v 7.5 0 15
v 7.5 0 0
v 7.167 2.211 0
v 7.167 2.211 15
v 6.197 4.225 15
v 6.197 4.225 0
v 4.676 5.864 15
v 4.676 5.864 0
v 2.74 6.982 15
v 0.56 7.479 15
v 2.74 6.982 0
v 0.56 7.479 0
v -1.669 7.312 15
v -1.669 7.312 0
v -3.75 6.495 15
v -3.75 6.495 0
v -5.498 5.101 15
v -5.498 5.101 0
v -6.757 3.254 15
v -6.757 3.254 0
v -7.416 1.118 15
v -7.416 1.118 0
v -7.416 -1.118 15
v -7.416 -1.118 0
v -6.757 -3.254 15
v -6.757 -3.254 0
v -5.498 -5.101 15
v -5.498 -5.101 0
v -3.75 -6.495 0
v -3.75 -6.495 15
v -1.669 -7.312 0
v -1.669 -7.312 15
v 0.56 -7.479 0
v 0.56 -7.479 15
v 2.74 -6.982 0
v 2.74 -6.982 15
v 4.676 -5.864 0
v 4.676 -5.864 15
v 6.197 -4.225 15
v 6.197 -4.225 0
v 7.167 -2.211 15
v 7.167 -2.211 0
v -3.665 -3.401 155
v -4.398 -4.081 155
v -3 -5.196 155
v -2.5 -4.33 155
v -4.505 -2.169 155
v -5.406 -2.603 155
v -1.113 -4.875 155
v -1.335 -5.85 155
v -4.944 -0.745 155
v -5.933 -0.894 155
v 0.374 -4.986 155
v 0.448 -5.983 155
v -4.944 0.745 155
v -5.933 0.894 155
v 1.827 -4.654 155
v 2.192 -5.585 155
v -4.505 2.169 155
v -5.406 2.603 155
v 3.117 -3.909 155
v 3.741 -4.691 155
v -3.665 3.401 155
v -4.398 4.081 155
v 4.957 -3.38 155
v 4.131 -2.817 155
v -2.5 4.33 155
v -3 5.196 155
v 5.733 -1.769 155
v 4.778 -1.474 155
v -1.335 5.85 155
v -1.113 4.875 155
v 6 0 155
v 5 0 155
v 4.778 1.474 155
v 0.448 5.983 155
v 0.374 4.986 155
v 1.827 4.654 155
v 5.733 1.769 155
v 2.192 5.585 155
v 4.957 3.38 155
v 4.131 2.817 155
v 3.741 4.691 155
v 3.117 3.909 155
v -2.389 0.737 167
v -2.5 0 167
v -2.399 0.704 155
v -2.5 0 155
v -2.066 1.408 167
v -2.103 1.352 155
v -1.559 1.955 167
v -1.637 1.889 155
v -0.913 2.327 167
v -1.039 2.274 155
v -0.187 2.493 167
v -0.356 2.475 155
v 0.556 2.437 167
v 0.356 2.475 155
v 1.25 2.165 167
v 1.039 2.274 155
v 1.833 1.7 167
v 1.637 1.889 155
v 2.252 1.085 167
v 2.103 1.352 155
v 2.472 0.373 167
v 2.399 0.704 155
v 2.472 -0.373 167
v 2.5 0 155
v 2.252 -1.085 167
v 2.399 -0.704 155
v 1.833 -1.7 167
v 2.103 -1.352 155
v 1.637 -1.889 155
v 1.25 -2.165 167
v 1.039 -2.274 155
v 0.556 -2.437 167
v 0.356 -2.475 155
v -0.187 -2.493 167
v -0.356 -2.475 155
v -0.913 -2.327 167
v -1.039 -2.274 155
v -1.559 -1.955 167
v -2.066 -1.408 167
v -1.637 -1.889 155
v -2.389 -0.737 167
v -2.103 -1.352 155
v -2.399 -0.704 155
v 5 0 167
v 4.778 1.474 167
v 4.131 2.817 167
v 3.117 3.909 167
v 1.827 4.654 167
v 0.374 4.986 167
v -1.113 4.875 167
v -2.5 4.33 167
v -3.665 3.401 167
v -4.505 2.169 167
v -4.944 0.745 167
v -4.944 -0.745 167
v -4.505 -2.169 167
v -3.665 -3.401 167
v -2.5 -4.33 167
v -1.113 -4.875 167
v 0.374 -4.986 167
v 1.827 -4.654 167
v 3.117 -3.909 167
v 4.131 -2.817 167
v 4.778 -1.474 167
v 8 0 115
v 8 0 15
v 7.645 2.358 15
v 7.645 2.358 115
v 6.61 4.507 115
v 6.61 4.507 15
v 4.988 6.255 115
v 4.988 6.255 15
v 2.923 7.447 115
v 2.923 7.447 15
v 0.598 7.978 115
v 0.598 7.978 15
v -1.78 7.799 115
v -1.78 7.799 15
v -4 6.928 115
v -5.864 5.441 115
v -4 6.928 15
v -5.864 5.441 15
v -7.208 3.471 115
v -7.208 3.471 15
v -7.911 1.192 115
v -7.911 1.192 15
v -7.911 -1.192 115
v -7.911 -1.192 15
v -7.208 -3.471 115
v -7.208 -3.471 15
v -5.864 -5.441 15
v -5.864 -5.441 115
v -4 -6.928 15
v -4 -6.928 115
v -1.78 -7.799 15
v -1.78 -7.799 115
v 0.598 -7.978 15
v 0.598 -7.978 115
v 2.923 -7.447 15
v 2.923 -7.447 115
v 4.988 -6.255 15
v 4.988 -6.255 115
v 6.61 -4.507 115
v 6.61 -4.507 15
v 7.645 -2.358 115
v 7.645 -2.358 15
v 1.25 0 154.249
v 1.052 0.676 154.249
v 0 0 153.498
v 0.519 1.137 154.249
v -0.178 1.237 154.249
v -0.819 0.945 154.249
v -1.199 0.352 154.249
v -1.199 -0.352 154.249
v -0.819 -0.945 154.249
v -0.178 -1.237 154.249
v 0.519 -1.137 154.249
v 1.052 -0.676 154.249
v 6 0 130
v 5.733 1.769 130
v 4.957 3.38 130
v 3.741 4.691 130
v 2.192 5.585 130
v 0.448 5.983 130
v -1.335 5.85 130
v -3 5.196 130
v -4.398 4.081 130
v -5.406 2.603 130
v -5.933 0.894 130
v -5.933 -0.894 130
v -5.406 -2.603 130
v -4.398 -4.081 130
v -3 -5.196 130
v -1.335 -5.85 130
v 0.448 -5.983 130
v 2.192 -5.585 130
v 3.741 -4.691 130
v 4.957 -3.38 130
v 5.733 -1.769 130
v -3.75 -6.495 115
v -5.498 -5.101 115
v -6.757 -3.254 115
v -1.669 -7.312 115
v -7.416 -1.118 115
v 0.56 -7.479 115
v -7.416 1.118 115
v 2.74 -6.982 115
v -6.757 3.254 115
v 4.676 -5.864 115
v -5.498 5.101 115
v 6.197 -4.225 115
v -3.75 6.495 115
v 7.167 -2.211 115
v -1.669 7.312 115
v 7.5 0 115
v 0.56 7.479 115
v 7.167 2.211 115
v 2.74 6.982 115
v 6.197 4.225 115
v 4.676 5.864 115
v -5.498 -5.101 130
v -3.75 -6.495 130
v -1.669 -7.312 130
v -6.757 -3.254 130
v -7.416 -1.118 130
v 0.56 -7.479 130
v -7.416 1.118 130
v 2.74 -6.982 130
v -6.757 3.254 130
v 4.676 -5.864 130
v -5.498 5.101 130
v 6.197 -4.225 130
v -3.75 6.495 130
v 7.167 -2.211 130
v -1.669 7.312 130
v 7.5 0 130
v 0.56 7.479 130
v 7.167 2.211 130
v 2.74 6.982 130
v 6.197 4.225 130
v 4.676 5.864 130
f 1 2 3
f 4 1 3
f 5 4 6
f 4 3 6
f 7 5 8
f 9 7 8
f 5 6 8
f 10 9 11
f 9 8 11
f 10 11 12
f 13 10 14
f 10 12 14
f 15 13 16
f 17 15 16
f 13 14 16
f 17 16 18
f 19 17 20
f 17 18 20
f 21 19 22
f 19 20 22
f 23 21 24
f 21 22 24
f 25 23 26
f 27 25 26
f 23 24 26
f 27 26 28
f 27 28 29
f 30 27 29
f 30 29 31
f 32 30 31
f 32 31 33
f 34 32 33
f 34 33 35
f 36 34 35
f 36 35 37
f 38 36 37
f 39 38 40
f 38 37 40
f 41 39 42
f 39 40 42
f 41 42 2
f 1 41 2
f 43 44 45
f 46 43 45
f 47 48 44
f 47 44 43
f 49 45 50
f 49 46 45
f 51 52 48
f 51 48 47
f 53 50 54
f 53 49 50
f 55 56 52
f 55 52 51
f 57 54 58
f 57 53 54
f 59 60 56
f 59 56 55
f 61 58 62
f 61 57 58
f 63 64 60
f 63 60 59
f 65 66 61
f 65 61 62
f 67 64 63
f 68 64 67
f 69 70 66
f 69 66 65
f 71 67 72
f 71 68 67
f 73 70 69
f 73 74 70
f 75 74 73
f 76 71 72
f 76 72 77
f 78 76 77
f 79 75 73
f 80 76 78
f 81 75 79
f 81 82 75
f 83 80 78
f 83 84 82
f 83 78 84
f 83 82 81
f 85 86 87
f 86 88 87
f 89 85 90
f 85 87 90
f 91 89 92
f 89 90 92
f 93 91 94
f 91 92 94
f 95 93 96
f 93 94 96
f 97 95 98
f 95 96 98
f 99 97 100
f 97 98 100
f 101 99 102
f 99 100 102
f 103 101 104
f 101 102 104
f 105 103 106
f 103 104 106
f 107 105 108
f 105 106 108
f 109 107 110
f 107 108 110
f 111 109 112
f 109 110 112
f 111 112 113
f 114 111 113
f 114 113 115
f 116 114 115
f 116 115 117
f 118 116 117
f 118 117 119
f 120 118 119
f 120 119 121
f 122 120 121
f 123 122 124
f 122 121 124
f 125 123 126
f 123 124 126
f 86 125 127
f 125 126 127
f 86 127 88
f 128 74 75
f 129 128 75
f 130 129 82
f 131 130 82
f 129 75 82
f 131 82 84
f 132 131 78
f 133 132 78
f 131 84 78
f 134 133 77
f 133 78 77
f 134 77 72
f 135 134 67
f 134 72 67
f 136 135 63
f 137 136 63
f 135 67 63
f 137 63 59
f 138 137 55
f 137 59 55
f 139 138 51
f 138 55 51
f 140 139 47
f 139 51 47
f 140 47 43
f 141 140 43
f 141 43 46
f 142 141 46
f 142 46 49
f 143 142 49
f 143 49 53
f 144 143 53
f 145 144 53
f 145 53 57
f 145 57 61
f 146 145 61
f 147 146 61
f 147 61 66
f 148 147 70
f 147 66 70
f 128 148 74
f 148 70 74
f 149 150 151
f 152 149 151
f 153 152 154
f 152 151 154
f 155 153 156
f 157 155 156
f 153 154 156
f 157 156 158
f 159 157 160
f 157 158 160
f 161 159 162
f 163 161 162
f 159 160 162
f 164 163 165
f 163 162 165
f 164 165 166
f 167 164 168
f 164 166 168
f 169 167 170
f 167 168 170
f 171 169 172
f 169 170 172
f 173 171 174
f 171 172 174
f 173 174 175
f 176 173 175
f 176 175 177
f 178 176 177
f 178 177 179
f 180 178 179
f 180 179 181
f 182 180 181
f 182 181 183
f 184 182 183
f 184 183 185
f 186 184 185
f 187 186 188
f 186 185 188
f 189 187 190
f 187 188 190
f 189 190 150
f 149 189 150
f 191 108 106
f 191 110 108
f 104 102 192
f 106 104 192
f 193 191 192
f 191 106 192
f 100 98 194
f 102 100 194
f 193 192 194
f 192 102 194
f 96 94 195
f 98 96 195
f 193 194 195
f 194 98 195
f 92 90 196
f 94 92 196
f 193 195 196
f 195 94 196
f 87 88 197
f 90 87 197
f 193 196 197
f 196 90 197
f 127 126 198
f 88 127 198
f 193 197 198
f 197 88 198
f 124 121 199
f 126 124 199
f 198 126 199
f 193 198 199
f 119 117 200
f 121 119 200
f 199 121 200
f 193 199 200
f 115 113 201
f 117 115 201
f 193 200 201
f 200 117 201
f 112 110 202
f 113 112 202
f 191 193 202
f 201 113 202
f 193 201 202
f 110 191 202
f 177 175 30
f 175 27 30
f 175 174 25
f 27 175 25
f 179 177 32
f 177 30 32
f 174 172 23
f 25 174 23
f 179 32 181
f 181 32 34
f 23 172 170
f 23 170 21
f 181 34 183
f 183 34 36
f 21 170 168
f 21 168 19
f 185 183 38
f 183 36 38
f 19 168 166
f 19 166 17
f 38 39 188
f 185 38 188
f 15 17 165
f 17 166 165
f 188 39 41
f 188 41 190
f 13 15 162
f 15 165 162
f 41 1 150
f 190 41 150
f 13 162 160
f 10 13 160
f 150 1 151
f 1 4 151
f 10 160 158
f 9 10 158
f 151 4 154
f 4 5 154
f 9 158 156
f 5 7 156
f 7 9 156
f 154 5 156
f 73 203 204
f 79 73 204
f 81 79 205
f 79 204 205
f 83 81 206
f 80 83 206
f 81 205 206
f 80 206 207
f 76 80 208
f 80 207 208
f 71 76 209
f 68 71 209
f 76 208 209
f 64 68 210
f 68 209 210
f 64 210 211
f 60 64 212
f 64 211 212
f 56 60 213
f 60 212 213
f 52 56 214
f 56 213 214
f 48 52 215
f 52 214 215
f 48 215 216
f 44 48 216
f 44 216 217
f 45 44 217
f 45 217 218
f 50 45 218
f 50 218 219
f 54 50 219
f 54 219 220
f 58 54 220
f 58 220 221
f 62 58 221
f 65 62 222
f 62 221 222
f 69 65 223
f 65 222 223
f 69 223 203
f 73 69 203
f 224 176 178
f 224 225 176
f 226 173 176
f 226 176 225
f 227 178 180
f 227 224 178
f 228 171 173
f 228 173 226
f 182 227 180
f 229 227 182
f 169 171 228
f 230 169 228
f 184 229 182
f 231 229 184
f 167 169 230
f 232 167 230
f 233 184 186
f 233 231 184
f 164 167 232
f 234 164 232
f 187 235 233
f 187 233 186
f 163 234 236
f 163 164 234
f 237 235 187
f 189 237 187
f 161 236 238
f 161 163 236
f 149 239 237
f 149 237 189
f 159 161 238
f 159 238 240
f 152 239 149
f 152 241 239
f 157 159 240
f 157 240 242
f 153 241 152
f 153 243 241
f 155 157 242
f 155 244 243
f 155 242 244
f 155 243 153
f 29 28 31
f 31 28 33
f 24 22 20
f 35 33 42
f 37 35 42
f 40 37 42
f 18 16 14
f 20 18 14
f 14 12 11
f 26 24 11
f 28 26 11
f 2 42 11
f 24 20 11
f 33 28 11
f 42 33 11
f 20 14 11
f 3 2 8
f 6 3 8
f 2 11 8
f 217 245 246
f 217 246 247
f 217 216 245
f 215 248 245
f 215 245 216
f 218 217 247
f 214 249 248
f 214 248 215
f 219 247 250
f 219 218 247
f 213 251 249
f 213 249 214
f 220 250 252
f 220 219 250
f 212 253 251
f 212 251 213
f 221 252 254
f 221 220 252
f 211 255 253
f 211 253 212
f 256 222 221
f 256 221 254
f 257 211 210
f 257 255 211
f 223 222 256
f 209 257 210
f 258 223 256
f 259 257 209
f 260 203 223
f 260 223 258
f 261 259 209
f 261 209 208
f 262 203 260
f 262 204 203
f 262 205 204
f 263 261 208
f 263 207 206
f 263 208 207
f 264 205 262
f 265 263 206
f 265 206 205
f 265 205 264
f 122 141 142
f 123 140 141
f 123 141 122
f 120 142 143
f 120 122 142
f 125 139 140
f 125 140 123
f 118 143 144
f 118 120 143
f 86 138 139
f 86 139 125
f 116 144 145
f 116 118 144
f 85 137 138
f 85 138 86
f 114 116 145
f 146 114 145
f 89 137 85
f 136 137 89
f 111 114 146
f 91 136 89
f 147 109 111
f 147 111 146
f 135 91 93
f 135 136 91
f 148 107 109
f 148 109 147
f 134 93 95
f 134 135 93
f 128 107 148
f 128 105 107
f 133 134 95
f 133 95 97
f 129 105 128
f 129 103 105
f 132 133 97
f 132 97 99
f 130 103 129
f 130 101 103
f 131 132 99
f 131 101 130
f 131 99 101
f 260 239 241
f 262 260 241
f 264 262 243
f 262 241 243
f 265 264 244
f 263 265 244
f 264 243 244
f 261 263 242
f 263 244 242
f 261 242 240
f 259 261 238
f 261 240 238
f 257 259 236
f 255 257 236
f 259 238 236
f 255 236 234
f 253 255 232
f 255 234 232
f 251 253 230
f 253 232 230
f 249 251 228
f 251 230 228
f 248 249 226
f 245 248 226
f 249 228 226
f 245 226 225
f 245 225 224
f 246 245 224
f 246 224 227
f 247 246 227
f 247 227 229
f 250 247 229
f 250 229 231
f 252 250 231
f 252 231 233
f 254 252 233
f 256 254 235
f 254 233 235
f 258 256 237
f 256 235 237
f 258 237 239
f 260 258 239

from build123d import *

# Parameters (mm, degrees)
F0_R      = 7.5
F1_DEPTH  = 15
F2_R      = 8
F3_DEPTH  = 100
F4_R      = 7.5
F5_DEPTH  = 15
F6_R      = 6
F7_DEPTH  = 25
F8_R      = 5
F9_DEPTH  = 12
F11_D     = 5
F11_DEPTH = 12
F11_TIP   = 1.5021515476


with BuildPart() as f1:
    # F0 (on Top) → F1 (new body)
    with BuildSketch(Plane.XY):
        Circle(F0_R)
    extrude(amount=F1_DEPTH)

    # F2 (on face) → F3 (join)
    with BuildSketch(Plane.XY.offset(15)):
        Circle(F2_R)
    extrude(amount=F3_DEPTH)

    # F4 (on face) → F5 (join)
    with BuildSketch(Plane.XY.offset(115)):
        Circle(F4_R)
    extrude(amount=F5_DEPTH)

    # F6 (on face) → F7 (join)
    with BuildSketch(Plane.XY.offset(130)):
        Circle(F6_R)
    extrude(amount=F7_DEPTH)

    # F8 (on face) → F9 (join)
    with BuildSketch(Plane.XY.offset(155)):
        Circle(F8_R)
    extrude(amount=F9_DEPTH)

    # F11
    with Locations(Plane.XY.offset(167)):
        with Locations((0, 0)):
            Hole(F11_D / 2, depth=F11_DEPTH)
            with Locations((0, 0, -(F11_DEPTH + F11_TIP / 2))):  # 118° drill point
                Cone(0, F11_D / 2, F11_TIP, mode=Mode.SUBTRACT)


solid = f1.part
